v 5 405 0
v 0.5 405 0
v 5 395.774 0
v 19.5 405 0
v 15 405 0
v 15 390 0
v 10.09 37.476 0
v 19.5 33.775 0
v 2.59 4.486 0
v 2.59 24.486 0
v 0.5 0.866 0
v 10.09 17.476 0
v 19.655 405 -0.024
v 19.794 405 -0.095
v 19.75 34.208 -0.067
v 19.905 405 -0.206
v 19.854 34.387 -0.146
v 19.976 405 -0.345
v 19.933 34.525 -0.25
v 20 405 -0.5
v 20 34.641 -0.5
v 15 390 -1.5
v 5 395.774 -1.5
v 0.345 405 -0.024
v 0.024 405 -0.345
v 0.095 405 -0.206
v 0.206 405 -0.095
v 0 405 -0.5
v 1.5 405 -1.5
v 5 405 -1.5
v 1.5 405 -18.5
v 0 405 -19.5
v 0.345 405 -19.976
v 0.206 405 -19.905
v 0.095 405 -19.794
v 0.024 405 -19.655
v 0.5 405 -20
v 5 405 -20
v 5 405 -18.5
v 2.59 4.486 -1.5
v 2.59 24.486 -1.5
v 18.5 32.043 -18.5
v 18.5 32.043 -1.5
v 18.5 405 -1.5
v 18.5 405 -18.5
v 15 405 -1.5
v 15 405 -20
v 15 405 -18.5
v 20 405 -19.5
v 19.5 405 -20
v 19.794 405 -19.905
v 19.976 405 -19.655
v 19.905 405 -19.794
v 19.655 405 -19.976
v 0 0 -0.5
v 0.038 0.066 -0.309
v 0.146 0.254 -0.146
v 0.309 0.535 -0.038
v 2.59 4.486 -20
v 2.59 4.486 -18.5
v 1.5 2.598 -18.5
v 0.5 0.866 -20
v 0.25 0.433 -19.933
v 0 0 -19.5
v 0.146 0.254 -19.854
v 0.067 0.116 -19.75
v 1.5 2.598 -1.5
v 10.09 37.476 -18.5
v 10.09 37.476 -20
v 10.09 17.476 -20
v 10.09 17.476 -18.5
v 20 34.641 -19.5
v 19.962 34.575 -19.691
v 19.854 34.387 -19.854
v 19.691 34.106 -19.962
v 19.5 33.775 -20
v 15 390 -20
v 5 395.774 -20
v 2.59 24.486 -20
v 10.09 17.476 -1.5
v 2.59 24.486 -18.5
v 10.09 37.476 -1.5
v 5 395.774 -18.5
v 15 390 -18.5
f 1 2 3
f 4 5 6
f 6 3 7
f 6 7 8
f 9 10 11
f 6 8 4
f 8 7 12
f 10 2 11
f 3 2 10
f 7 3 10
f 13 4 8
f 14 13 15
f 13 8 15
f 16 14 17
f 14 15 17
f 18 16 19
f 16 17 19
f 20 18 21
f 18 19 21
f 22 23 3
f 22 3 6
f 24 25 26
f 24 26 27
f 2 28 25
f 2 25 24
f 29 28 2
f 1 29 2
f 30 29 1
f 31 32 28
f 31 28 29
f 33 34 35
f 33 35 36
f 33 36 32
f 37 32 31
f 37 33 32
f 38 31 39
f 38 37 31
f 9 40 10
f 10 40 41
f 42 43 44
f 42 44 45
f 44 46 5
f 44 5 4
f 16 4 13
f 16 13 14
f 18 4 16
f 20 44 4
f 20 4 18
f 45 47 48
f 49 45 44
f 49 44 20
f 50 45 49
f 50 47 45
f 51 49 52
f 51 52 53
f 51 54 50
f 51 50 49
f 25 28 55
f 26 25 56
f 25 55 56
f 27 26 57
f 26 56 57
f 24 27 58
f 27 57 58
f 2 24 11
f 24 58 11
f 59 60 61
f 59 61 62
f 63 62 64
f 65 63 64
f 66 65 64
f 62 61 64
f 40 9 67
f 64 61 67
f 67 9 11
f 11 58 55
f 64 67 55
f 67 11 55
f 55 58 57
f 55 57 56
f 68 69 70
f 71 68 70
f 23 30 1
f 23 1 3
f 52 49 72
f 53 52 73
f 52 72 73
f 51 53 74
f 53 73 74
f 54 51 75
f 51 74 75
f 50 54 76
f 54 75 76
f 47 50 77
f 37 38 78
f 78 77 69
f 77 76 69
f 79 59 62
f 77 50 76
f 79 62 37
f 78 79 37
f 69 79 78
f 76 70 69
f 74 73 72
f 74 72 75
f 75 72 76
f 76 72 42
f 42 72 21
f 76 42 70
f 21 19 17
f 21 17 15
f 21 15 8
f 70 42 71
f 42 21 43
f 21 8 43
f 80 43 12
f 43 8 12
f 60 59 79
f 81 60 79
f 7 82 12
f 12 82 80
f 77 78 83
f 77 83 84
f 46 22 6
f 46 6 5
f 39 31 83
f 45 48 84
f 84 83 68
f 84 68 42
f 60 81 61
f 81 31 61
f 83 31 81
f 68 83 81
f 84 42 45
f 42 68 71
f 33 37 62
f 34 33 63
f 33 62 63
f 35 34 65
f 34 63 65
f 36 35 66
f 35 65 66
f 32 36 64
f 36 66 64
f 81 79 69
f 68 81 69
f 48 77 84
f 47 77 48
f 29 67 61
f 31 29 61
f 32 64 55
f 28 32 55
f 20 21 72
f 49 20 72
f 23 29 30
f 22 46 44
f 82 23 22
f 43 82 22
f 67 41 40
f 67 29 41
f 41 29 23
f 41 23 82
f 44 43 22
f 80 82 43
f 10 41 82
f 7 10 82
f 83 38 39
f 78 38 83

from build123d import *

# Parameters (mm, degrees)
SKETCH1_W           = 17
SKETCH1_H           = 17
BOSS_EXTRUDE1_DEPTH = 405
CUT_EXTRUDE2_DEPTH  = 406.986452976
CUT_EXTRUDE4_DEPTH  = 20
CUT_EXTRUDE5_DEPTH  = 406.986452976


with BuildPart() as part:
    # Sketch1 → Boss-Extrude1 (new body)
    with BuildSketch(Plane(origin=(0, 0, 0), x_dir=(1, 0, 0), z_dir=(0, 1, 0))):
        with BuildLine():
            Line((0.5, 0), (19.5, 0))
            ThreePointArc((19.5, 0), (19.853553391, 0.146446609), (20, 0.5))
            Line((20, 0.5), (20, 19.5))
            ThreePointArc((20, 19.5), (19.853553391, 19.853553391), (19.5, 20))
            Line((19.5, 20), (0.5, 20))
            ThreePointArc((0.5, 20), (0.146446609, 19.853553391), (0, 19.5))
            Line((0, 19.5), (0, 0.5))
            ThreePointArc((0, 0.5), (0.146446609, 0.146446609), (0.5, 0))
        make_face()
        with Locations((10, 10)):
            Rectangle(SKETCH1_W, SKETCH1_H, mode=Mode.SUBTRACT)
    extrude(amount=BOSS_EXTRUDE1_DEPTH)

    # Sketch4 → Cut-Extrude2 (cut, through all)
    with BuildSketch(Plane(origin=(0, 0, -20), x_dir=(-1, 0, 0), z_dir=(0, 0, -1))):
        Polygon((-5, 405), (-5, 395.773502692), (-15, 390), (-15, 405), align=None)
    extrude(amount=-CUT_EXTRUDE2_DEPTH, mode=Mode.SUBTRACT)

    # Sketch2 → Cut-Extrude4 (cut)
    with BuildSketch(Plane.XY):
        Polygon((20, 0), (20, 34.641016151), (0, 0), align=None)
    extrude(amount=-CUT_EXTRUDE4_DEPTH, mode=Mode.SUBTRACT)

    # Sketch6 → Cut-Extrude5 (cut, through all)
    with BuildSketch(Plane(origin=(0, 0, -20), x_dir=(-1, 0, 0), z_dir=(0, 0, -1))):
        Polygon((-2.59, 4.486011592), (-2.59, 24.486011592), (-10.09, 37.476392648), (-10.09, 17.476392648), align=None)
    extrude(amount=-CUT_EXTRUDE5_DEPTH, mode=Mode.SUBTRACT)


solid = part.part
